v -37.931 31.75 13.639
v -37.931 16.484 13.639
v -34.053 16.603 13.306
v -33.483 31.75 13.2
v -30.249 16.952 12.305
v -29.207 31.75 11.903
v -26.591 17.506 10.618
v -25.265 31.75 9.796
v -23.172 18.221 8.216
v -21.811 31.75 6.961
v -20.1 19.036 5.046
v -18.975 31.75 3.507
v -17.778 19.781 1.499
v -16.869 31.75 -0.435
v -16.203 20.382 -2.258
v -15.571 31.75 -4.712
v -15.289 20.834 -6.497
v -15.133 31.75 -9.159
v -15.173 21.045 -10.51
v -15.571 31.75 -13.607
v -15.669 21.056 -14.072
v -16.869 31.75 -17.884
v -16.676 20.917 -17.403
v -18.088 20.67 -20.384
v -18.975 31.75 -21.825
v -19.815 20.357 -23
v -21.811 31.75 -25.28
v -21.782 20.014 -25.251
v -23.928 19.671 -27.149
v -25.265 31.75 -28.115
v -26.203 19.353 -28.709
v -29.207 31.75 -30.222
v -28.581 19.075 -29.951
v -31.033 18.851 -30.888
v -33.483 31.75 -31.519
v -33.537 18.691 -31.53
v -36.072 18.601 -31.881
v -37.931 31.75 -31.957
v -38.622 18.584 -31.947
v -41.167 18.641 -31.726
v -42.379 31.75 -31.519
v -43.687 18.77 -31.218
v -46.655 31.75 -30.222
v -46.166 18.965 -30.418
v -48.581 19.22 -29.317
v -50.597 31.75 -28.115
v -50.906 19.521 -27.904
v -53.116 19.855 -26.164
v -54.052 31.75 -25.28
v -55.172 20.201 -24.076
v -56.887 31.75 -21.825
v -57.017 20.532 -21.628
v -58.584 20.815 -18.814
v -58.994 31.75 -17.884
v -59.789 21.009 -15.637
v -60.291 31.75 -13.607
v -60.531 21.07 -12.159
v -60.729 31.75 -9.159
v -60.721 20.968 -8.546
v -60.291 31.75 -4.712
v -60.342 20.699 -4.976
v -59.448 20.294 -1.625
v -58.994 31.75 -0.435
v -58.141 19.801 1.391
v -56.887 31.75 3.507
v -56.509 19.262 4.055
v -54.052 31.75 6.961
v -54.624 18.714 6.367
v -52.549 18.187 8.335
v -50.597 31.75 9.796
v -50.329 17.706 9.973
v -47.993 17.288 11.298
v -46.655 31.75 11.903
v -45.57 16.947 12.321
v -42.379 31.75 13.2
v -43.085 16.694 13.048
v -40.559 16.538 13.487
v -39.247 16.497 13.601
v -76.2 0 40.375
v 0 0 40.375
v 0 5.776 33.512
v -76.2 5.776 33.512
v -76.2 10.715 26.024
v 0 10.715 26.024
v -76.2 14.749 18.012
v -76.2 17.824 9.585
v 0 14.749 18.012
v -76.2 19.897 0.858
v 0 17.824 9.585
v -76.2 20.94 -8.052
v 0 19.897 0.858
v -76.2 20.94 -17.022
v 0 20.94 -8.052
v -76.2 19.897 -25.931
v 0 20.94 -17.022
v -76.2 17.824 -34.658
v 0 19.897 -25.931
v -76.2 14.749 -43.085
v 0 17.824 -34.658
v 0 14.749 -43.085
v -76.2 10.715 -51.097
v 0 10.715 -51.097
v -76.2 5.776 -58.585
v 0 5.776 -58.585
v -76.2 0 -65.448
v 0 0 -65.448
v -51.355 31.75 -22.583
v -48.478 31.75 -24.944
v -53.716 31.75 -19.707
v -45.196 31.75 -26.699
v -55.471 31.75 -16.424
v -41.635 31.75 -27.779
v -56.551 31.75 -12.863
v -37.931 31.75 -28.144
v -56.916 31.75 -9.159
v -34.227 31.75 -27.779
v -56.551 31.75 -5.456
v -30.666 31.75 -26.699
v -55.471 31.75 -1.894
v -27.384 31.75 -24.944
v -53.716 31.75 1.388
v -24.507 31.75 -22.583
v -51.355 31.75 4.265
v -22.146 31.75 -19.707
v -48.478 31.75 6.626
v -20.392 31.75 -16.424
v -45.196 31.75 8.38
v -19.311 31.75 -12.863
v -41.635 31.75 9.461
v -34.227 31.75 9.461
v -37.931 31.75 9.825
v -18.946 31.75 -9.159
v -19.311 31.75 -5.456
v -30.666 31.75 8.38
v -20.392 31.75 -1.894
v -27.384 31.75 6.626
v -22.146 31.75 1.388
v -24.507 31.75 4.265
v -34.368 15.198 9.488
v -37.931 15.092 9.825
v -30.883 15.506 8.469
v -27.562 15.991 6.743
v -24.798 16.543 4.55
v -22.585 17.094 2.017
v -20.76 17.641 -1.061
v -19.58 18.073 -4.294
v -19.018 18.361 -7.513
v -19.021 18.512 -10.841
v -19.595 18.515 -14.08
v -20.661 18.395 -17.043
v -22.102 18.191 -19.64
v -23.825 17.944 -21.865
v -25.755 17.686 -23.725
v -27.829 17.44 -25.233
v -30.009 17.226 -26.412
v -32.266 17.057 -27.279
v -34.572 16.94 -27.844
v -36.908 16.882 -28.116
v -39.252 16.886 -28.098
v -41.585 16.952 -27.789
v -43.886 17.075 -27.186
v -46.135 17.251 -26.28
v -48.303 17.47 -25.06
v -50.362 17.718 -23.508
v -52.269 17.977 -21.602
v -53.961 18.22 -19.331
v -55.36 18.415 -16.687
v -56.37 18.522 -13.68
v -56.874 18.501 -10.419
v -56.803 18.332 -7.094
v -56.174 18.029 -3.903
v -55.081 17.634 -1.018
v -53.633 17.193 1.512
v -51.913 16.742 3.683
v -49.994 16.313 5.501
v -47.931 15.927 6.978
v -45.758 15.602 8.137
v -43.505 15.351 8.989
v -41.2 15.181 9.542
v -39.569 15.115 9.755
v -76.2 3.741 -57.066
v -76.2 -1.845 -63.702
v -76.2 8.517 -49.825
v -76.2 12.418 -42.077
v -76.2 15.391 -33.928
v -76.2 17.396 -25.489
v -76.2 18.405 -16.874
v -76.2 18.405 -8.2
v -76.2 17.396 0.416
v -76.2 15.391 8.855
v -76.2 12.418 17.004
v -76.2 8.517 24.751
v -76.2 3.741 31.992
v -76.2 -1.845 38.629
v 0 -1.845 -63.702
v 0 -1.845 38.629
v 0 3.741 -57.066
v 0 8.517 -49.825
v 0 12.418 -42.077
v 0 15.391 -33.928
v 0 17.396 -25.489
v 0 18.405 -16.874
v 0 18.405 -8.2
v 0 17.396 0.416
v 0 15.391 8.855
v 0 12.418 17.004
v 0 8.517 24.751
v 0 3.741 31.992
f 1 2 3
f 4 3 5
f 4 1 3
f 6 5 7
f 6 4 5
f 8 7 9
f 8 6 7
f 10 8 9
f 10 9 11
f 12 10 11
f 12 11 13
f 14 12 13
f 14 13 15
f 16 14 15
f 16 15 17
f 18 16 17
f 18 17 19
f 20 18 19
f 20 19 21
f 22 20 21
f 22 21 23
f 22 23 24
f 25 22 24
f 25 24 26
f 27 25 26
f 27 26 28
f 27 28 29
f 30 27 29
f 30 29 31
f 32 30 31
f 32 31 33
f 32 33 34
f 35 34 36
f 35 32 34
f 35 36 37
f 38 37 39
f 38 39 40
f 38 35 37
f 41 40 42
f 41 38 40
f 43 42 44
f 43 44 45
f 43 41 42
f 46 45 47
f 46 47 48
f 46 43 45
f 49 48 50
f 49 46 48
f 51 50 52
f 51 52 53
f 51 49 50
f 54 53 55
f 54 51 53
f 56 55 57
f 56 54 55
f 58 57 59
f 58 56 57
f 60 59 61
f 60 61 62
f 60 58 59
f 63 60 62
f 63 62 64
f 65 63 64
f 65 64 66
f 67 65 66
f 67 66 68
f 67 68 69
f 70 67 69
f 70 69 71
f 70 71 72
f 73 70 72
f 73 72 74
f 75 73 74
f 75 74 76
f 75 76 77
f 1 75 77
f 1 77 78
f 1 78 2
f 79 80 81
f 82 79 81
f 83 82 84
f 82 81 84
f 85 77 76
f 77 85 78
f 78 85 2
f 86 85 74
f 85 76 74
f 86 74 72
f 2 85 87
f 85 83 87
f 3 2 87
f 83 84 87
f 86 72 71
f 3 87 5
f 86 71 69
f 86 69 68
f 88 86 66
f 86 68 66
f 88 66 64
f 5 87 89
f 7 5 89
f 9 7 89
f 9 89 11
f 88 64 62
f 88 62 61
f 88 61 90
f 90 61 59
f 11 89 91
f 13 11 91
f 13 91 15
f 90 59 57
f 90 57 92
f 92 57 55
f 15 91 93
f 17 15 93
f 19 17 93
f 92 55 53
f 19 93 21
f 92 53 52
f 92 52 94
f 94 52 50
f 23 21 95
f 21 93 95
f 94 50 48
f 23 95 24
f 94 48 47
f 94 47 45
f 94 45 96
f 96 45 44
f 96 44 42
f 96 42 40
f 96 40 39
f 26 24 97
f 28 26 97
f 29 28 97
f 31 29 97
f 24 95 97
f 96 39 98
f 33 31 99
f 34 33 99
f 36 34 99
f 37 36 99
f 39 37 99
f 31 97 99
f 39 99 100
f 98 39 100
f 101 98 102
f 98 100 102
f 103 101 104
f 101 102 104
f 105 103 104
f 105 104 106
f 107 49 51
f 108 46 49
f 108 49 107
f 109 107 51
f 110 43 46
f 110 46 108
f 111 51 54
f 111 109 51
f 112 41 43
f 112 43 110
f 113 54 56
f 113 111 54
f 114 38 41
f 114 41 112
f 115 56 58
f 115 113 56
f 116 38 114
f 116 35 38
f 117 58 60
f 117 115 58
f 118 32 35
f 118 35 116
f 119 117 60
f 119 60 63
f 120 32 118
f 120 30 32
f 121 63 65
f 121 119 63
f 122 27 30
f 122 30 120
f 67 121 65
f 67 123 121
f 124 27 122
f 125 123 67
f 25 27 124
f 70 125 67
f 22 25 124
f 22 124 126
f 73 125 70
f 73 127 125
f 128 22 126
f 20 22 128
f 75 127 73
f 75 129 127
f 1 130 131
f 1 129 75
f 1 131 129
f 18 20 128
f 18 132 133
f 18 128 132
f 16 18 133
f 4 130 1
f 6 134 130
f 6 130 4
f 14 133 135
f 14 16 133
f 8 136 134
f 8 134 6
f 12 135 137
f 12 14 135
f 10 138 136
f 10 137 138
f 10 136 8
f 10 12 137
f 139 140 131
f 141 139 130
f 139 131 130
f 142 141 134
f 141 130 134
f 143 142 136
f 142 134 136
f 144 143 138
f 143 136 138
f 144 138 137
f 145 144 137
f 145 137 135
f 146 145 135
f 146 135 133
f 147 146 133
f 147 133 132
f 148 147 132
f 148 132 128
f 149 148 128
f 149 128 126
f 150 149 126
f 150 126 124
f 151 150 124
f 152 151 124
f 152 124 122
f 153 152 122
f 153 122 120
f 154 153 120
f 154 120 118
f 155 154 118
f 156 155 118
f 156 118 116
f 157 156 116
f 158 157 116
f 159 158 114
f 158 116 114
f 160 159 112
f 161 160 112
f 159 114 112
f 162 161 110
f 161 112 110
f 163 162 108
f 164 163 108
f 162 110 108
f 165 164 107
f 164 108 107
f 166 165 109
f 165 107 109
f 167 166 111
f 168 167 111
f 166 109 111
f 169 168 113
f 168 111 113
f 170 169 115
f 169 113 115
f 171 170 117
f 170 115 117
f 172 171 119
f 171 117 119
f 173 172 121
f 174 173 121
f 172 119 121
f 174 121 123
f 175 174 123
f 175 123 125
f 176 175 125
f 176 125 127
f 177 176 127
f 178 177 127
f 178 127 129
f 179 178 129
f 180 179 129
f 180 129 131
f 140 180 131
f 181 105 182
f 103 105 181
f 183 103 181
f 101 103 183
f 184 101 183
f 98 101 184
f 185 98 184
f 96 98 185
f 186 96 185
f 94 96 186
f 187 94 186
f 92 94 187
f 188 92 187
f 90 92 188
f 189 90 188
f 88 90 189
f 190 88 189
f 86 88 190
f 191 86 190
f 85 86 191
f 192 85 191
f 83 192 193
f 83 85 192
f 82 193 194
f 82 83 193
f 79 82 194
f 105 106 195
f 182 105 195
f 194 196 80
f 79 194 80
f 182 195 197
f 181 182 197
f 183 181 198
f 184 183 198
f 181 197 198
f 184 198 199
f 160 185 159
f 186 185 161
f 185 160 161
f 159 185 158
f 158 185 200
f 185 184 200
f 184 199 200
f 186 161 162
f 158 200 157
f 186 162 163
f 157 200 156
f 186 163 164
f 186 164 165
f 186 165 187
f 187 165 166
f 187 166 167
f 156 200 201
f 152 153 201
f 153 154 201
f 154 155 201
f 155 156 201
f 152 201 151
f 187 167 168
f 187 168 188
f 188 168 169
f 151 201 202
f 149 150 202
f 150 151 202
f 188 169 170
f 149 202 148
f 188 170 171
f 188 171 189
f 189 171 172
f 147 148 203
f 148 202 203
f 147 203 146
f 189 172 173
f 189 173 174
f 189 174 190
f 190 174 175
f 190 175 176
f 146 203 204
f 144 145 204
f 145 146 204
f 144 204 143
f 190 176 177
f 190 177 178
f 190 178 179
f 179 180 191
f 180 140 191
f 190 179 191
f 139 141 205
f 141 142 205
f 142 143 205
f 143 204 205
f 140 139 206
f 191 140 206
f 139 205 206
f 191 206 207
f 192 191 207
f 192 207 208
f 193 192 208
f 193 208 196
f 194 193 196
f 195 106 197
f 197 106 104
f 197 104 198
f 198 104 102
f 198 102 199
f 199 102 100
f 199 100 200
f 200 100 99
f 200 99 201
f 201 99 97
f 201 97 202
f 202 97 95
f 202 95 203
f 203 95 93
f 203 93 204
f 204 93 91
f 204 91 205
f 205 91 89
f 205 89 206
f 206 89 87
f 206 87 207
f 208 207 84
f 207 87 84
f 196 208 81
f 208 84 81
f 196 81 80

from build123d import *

# Parameters (mm, degrees)
EXTRUDE_THIN1_DEPTH = 76.2
EXTRUDE1_REACH      = 107.917
EXTRUDE1_END_RADIUS = 76.967998962
SKETCH2_R           = 22.797803907
SKETCH3_R           = 18.98465739
EXTRUDE2_DEPTH      = 76.2


with BuildPart() as part:
    # Sketch1 → Extrude-Thin1 (new body)
    with BuildSketch(Plane(origin=(0, 0, 0), x_dir=(0, 0, -1), z_dir=(1, 0, 0))):
        with BuildLine():
            ThreePointArc((-40.374745946, 0), (12.536707256, 21.071210286), (65.448160458, 0))
            Line((65.448160458, 0), (63.702043982, -1.84463472))
            ThreePointArc((63.702043982, -1.84463472), (12.536707256, 18.531210286), (-38.628629469, -1.84463472))
            Line((-38.628629469, -1.84463472), (-40.374745946, 0))
        make_face()
    extrude(amount=-EXTRUDE_THIN1_DEPTH)

    # Extrude1: up to this cylinder (the profile starts outside it)
    extrude1_end = Plane(origin=(-37.931127, -55.896788676, -12.536707256), z_dir=(1, 0, 0)) * Cylinder(EXTRUDE1_END_RADIUS, 370.769997925, mode=Mode.PRIVATE)
    # Sketch2 → Extrude1 (add, up to the surface)
    with BuildSketch(Plane(origin=(0, 31.75, 0), x_dir=(-1, 0, 0), z_dir=(0, 1, 0)), mode=Mode.PRIVATE) as extrude1_sk1:
        with Locations(Location((37.931127378, -9.159254826, 0), (0, 0, 90))):
            Circle(SKETCH2_R)
    extrude1_tool1 = extrude(extrude1_sk1.sketch, amount=-EXTRUDE1_REACH, mode=Mode.PRIVATE) - extrude1_end
    add(extrude1_tool1.solids().sort_by_distance((-37.931127, 31.75, -9.159255))[0])

    # Sketch3 → Extrude2 (cut)
    with BuildSketch(Plane(origin=(0, 31.75, 0), x_dir=(-1, 0, 0), z_dir=(0, 1, 0))):
        with Locations(Location((37.931127378, -9.159254826, 0), (0, 0, 90))):
            Circle(SKETCH3_R)
    extrude(amount=-EXTRUDE2_DEPTH, mode=Mode.SUBTRACT)


solid = part.part
